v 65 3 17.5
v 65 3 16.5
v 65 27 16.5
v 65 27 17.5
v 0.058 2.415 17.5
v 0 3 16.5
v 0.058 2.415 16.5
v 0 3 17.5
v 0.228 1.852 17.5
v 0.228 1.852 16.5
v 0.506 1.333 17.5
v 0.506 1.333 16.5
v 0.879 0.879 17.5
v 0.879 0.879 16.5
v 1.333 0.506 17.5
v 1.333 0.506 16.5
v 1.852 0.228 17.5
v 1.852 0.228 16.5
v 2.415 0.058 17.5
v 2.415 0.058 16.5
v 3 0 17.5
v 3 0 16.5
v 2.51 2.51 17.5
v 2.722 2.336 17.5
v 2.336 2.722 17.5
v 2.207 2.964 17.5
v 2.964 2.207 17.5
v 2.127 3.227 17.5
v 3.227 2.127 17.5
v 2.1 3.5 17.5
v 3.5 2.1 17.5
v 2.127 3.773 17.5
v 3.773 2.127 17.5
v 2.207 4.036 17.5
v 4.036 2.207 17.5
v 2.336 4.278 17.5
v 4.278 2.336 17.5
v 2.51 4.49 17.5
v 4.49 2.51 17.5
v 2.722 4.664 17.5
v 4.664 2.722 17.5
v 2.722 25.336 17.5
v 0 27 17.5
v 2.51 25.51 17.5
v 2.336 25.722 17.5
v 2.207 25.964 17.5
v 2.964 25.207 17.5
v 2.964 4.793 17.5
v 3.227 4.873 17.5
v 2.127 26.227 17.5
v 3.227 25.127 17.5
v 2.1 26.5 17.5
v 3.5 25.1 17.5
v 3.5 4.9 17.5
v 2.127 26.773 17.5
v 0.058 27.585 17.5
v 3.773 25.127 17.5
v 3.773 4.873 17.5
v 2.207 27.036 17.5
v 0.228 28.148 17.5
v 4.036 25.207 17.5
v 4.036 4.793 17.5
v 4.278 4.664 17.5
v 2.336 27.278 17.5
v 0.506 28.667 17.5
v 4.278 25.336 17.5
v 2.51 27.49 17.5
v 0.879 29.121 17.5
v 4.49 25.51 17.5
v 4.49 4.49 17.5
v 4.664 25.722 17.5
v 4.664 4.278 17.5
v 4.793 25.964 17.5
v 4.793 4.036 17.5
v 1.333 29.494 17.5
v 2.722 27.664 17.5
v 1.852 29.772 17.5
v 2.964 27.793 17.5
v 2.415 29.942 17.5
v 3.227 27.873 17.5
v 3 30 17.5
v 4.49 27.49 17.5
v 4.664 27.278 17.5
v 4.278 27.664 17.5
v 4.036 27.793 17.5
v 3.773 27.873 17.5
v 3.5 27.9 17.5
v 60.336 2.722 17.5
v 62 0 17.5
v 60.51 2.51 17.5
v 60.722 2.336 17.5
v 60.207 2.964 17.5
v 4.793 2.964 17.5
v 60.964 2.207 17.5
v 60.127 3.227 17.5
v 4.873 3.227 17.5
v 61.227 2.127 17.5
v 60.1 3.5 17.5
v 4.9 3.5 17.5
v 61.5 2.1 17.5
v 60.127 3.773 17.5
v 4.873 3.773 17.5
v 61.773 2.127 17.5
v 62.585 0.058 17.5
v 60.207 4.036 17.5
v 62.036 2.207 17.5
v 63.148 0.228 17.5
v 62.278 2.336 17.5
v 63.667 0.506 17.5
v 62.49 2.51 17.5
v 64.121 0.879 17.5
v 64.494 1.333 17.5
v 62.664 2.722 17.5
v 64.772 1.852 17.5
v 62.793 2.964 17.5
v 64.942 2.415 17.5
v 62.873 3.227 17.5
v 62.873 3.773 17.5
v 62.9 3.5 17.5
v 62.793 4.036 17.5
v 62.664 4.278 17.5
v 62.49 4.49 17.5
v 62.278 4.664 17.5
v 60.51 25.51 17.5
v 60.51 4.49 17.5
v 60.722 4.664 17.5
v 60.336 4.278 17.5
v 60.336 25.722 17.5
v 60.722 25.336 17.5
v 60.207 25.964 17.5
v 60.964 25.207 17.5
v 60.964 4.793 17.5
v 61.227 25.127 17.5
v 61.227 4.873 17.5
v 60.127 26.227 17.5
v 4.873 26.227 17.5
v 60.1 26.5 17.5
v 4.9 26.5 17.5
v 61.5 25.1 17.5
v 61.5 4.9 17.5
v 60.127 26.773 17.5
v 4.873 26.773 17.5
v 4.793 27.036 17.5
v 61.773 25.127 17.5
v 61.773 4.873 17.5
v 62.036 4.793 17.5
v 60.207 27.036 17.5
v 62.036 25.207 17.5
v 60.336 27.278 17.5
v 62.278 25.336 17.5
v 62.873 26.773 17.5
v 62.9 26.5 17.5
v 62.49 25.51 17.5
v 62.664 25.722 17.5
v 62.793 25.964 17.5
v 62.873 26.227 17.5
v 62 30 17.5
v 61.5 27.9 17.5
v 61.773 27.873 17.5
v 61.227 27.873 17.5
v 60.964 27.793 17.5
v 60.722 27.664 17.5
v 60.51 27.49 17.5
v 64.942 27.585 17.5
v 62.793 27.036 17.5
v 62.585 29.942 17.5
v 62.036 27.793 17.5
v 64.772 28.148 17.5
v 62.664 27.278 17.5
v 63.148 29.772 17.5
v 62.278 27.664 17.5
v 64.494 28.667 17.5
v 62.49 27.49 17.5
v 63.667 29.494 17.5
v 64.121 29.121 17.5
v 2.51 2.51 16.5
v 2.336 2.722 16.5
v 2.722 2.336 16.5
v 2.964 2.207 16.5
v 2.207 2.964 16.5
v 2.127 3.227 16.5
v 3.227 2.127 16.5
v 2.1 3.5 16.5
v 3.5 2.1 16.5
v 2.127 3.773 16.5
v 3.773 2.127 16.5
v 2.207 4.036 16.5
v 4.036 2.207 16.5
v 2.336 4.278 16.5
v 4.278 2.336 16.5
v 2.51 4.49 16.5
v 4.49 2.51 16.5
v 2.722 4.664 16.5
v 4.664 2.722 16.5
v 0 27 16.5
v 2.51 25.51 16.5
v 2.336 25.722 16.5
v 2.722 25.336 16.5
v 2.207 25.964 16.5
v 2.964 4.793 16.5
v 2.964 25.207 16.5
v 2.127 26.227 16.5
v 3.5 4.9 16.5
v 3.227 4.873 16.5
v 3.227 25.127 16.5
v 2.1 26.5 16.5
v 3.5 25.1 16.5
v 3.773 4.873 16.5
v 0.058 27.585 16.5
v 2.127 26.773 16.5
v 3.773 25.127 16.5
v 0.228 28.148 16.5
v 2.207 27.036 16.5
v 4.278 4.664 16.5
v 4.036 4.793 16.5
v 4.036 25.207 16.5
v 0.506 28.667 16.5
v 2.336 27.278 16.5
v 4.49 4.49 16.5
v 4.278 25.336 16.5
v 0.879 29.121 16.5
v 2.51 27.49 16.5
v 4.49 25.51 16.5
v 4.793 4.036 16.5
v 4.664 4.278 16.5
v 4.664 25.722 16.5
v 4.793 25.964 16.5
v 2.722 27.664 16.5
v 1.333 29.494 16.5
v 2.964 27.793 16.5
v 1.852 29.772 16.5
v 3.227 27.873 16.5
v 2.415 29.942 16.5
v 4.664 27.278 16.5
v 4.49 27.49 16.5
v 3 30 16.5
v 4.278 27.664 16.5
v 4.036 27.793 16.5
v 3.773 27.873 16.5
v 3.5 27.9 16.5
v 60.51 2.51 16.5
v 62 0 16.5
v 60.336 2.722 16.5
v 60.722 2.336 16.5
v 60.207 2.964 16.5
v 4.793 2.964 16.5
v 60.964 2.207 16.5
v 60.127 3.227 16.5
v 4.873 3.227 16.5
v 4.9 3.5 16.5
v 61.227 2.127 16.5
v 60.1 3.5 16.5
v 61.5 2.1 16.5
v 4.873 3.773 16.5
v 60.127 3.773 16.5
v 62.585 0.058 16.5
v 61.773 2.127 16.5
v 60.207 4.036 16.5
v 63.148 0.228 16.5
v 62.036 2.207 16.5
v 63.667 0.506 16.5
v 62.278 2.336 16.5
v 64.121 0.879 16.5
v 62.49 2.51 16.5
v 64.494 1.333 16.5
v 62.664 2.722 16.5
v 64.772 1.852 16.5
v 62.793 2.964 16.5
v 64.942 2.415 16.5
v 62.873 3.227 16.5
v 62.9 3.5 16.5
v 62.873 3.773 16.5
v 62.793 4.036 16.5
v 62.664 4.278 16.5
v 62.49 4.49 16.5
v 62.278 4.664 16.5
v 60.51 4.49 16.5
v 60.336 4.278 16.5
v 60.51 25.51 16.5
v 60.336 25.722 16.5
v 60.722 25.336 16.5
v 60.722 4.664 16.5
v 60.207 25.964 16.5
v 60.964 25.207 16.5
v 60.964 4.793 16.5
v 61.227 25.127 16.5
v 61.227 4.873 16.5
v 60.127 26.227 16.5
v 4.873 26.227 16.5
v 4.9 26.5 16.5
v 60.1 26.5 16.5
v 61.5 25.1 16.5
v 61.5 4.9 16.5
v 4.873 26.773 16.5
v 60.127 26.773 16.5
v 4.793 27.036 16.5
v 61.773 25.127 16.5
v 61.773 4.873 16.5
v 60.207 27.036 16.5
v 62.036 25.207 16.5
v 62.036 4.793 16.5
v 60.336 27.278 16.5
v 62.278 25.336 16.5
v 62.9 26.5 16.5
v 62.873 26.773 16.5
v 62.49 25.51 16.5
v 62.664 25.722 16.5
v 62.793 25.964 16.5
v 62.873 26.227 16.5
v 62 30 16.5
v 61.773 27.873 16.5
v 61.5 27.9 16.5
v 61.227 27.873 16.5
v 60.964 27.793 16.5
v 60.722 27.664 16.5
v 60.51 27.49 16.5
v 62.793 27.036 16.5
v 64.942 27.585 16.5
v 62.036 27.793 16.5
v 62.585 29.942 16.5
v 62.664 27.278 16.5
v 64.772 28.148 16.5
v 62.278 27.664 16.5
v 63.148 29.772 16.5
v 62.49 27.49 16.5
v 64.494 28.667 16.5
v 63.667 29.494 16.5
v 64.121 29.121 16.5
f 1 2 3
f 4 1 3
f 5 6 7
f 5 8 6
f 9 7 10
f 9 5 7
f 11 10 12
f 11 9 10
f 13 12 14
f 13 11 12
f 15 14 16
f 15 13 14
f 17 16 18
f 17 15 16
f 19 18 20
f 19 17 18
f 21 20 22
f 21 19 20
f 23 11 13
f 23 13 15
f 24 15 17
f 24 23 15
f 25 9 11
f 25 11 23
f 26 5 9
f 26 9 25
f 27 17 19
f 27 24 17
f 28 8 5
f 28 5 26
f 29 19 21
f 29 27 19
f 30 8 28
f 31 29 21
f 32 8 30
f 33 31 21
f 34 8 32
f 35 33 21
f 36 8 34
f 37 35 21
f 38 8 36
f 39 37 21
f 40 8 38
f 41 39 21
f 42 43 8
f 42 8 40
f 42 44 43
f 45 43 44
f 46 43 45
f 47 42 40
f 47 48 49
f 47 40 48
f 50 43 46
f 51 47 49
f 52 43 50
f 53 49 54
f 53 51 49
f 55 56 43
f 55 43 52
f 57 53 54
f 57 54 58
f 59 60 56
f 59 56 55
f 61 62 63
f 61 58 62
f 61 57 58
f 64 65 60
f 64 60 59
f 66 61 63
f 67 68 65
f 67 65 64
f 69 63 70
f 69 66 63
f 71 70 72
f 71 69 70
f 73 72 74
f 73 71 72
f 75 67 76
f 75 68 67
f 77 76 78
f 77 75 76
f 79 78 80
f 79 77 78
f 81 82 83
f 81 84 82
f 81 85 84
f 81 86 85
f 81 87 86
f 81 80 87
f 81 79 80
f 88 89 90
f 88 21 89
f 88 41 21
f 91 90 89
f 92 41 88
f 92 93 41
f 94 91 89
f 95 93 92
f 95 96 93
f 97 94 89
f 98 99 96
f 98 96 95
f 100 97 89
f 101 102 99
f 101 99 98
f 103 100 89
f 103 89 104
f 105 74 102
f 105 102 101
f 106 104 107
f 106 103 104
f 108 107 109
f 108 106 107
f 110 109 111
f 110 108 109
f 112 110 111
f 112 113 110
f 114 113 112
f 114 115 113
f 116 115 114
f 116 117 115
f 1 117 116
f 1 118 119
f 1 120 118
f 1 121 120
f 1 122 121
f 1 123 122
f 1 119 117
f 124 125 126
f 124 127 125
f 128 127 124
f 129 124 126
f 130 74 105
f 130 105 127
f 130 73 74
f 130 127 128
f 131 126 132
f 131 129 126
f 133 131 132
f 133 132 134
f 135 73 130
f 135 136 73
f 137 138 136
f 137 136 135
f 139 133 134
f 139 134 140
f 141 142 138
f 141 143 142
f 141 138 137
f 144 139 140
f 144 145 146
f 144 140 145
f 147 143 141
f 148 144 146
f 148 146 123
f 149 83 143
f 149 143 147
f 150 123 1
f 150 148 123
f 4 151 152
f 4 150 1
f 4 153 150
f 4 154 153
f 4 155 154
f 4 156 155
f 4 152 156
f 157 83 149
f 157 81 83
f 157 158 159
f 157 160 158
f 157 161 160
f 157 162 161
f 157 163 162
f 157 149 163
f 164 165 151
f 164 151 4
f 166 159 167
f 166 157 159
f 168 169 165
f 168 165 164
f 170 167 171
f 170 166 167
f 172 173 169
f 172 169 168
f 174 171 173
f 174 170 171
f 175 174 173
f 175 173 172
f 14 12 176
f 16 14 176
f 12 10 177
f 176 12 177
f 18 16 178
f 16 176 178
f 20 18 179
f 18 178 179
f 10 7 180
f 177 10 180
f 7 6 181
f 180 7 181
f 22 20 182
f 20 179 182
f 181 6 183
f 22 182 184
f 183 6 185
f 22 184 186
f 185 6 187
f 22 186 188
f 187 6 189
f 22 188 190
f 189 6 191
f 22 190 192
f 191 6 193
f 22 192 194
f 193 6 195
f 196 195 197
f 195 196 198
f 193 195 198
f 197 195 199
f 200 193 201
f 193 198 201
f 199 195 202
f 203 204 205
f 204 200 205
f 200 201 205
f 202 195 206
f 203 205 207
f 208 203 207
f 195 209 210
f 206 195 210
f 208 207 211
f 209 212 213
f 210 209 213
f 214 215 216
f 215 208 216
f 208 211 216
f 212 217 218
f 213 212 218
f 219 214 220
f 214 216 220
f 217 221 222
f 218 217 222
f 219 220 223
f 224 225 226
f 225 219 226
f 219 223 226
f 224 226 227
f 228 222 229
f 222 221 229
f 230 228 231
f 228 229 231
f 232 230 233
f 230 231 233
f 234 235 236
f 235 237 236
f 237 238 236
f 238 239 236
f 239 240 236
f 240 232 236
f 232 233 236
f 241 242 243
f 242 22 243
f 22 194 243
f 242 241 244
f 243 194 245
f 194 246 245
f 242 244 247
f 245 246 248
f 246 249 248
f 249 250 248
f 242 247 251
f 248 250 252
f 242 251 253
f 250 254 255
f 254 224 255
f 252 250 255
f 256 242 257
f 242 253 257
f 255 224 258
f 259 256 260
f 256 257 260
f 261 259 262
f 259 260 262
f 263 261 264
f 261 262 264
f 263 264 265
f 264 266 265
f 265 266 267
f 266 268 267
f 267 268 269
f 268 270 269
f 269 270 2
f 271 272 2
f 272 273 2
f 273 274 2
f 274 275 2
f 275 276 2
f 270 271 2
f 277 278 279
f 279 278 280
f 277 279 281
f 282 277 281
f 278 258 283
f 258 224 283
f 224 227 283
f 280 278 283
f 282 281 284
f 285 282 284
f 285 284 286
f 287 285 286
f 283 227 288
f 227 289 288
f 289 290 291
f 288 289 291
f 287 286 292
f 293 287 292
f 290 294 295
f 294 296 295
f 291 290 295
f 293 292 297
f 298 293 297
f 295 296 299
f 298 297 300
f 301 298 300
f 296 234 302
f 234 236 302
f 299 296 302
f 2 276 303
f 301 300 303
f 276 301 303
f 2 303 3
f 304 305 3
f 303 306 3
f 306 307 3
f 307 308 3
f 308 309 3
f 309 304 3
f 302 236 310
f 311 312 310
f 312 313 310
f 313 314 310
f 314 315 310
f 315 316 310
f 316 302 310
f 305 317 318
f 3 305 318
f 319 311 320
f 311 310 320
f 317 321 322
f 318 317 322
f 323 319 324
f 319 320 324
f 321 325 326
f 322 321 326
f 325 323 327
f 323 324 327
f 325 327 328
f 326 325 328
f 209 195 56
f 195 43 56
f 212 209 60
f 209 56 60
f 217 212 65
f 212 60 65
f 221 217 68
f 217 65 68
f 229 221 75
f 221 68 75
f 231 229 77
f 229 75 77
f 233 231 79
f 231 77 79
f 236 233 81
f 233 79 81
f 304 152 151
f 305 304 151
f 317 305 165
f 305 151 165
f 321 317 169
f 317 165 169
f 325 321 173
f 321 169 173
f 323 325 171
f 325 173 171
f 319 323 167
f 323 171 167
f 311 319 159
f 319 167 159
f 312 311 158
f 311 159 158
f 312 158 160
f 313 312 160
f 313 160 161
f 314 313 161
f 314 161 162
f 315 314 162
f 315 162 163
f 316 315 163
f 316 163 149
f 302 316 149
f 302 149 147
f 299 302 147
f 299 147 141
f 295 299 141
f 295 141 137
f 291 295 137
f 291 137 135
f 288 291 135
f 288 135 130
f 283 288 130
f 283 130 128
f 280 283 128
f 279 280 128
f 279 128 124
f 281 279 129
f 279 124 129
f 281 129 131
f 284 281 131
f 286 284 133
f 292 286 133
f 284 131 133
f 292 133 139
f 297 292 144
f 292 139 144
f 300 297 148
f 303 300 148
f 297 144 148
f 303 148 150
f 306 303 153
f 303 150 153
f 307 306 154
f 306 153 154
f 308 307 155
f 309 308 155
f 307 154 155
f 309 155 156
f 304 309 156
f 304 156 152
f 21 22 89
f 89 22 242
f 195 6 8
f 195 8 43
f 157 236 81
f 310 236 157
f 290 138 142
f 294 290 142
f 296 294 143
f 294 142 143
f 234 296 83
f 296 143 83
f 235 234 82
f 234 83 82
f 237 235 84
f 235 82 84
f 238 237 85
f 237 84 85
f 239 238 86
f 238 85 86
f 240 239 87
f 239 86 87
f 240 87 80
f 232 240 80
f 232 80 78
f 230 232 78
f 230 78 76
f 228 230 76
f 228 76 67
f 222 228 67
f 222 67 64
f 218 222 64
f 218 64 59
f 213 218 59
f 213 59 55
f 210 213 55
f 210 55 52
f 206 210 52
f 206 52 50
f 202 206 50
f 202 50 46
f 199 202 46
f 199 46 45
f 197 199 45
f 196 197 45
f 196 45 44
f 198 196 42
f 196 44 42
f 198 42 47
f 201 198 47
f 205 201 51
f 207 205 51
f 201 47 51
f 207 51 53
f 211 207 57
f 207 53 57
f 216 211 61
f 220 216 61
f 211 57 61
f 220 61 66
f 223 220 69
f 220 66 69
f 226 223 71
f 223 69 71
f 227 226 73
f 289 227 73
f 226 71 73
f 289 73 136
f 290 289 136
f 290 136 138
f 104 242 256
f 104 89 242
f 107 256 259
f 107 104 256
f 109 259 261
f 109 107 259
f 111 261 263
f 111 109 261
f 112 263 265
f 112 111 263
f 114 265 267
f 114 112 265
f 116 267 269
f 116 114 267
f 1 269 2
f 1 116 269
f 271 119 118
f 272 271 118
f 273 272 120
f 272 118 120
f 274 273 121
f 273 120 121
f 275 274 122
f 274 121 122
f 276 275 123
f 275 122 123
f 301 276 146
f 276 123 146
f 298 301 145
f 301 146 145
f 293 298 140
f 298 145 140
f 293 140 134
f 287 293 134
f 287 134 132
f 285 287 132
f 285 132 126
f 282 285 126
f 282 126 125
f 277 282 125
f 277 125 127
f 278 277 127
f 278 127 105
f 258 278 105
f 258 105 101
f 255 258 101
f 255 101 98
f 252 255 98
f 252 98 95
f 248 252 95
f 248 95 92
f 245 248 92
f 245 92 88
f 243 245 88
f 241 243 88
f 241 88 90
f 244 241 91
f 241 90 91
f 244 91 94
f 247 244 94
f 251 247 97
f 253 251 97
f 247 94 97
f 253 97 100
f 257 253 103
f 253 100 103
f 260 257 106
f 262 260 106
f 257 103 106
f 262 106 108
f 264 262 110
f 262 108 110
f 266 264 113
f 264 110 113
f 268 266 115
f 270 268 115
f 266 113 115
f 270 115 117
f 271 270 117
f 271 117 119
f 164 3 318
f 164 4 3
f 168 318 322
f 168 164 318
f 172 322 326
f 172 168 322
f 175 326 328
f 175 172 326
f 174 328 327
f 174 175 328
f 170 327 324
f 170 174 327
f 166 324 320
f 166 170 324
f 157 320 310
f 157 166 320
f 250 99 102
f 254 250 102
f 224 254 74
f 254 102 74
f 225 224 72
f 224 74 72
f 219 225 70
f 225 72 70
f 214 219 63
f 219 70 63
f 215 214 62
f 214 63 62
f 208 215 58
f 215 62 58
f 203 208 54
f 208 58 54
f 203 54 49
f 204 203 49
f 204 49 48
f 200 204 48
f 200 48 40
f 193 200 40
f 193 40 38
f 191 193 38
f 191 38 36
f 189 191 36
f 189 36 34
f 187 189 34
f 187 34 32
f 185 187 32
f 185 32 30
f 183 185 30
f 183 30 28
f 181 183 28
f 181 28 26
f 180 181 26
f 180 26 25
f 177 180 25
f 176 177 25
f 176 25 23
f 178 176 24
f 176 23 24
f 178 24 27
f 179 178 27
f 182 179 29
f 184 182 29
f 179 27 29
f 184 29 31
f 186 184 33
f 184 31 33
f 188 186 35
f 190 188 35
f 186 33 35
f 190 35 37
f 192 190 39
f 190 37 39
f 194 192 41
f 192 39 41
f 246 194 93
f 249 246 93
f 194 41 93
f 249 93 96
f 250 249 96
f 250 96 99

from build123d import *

# Parameters (mm, degrees)
SKETCH018_W            = 65
SKETCH018_H            = 30
PAD014_DEPTH           = 1
FILLET007_R            = 3
SKETCH019_R            = 1.4
POCKET003_DEPTH        = 5
LINEARPATTERN007_COUNT = 2
LINEARPATTERN007_PITCH = 58


with BuildPart() as part:
    # Sketch018 (on Face1 of ReferencePad013) → Pad014 (new body)
    with BuildSketch(Plane.XY.offset(16.5)):
        with Locations((32.5, 15)):
            Rectangle(SKETCH018_W, SKETCH018_H)
    extrude(amount=PAD014_DEPTH)

    # Fillet007
    fillet007_edges = [part.edges().sort_by_distance(p)[0] for p in [
        (0, 0, 17),
        (0, 30, 17),
        (65, 0, 17),
        (65, 30, 17),
    ]]
    fillet(fillet007_edges, radius=FILLET007_R)

    # Sketch019 (on Face5 of Fillet007) → Pocket003 (cut)
    with BuildSketch(Plane.XY.offset(17.5)):
        with Locations((3.5, 26.5)):
            Circle(SKETCH019_R)
        with Locations((3.5, 3.5)):
            Circle(SKETCH019_R)
    pocket003 = extrude(amount=-POCKET003_DEPTH, mode=Mode.SUBTRACT)

    # LinearPattern007: Pocket003 ×2
    with Locations(*[(i * LINEARPATTERN007_PITCH, 0, 0) for i in range(1, LINEARPATTERN007_COUNT)]):
        add(pocket003, mode=Mode.SUBTRACT)


solid = part.part
